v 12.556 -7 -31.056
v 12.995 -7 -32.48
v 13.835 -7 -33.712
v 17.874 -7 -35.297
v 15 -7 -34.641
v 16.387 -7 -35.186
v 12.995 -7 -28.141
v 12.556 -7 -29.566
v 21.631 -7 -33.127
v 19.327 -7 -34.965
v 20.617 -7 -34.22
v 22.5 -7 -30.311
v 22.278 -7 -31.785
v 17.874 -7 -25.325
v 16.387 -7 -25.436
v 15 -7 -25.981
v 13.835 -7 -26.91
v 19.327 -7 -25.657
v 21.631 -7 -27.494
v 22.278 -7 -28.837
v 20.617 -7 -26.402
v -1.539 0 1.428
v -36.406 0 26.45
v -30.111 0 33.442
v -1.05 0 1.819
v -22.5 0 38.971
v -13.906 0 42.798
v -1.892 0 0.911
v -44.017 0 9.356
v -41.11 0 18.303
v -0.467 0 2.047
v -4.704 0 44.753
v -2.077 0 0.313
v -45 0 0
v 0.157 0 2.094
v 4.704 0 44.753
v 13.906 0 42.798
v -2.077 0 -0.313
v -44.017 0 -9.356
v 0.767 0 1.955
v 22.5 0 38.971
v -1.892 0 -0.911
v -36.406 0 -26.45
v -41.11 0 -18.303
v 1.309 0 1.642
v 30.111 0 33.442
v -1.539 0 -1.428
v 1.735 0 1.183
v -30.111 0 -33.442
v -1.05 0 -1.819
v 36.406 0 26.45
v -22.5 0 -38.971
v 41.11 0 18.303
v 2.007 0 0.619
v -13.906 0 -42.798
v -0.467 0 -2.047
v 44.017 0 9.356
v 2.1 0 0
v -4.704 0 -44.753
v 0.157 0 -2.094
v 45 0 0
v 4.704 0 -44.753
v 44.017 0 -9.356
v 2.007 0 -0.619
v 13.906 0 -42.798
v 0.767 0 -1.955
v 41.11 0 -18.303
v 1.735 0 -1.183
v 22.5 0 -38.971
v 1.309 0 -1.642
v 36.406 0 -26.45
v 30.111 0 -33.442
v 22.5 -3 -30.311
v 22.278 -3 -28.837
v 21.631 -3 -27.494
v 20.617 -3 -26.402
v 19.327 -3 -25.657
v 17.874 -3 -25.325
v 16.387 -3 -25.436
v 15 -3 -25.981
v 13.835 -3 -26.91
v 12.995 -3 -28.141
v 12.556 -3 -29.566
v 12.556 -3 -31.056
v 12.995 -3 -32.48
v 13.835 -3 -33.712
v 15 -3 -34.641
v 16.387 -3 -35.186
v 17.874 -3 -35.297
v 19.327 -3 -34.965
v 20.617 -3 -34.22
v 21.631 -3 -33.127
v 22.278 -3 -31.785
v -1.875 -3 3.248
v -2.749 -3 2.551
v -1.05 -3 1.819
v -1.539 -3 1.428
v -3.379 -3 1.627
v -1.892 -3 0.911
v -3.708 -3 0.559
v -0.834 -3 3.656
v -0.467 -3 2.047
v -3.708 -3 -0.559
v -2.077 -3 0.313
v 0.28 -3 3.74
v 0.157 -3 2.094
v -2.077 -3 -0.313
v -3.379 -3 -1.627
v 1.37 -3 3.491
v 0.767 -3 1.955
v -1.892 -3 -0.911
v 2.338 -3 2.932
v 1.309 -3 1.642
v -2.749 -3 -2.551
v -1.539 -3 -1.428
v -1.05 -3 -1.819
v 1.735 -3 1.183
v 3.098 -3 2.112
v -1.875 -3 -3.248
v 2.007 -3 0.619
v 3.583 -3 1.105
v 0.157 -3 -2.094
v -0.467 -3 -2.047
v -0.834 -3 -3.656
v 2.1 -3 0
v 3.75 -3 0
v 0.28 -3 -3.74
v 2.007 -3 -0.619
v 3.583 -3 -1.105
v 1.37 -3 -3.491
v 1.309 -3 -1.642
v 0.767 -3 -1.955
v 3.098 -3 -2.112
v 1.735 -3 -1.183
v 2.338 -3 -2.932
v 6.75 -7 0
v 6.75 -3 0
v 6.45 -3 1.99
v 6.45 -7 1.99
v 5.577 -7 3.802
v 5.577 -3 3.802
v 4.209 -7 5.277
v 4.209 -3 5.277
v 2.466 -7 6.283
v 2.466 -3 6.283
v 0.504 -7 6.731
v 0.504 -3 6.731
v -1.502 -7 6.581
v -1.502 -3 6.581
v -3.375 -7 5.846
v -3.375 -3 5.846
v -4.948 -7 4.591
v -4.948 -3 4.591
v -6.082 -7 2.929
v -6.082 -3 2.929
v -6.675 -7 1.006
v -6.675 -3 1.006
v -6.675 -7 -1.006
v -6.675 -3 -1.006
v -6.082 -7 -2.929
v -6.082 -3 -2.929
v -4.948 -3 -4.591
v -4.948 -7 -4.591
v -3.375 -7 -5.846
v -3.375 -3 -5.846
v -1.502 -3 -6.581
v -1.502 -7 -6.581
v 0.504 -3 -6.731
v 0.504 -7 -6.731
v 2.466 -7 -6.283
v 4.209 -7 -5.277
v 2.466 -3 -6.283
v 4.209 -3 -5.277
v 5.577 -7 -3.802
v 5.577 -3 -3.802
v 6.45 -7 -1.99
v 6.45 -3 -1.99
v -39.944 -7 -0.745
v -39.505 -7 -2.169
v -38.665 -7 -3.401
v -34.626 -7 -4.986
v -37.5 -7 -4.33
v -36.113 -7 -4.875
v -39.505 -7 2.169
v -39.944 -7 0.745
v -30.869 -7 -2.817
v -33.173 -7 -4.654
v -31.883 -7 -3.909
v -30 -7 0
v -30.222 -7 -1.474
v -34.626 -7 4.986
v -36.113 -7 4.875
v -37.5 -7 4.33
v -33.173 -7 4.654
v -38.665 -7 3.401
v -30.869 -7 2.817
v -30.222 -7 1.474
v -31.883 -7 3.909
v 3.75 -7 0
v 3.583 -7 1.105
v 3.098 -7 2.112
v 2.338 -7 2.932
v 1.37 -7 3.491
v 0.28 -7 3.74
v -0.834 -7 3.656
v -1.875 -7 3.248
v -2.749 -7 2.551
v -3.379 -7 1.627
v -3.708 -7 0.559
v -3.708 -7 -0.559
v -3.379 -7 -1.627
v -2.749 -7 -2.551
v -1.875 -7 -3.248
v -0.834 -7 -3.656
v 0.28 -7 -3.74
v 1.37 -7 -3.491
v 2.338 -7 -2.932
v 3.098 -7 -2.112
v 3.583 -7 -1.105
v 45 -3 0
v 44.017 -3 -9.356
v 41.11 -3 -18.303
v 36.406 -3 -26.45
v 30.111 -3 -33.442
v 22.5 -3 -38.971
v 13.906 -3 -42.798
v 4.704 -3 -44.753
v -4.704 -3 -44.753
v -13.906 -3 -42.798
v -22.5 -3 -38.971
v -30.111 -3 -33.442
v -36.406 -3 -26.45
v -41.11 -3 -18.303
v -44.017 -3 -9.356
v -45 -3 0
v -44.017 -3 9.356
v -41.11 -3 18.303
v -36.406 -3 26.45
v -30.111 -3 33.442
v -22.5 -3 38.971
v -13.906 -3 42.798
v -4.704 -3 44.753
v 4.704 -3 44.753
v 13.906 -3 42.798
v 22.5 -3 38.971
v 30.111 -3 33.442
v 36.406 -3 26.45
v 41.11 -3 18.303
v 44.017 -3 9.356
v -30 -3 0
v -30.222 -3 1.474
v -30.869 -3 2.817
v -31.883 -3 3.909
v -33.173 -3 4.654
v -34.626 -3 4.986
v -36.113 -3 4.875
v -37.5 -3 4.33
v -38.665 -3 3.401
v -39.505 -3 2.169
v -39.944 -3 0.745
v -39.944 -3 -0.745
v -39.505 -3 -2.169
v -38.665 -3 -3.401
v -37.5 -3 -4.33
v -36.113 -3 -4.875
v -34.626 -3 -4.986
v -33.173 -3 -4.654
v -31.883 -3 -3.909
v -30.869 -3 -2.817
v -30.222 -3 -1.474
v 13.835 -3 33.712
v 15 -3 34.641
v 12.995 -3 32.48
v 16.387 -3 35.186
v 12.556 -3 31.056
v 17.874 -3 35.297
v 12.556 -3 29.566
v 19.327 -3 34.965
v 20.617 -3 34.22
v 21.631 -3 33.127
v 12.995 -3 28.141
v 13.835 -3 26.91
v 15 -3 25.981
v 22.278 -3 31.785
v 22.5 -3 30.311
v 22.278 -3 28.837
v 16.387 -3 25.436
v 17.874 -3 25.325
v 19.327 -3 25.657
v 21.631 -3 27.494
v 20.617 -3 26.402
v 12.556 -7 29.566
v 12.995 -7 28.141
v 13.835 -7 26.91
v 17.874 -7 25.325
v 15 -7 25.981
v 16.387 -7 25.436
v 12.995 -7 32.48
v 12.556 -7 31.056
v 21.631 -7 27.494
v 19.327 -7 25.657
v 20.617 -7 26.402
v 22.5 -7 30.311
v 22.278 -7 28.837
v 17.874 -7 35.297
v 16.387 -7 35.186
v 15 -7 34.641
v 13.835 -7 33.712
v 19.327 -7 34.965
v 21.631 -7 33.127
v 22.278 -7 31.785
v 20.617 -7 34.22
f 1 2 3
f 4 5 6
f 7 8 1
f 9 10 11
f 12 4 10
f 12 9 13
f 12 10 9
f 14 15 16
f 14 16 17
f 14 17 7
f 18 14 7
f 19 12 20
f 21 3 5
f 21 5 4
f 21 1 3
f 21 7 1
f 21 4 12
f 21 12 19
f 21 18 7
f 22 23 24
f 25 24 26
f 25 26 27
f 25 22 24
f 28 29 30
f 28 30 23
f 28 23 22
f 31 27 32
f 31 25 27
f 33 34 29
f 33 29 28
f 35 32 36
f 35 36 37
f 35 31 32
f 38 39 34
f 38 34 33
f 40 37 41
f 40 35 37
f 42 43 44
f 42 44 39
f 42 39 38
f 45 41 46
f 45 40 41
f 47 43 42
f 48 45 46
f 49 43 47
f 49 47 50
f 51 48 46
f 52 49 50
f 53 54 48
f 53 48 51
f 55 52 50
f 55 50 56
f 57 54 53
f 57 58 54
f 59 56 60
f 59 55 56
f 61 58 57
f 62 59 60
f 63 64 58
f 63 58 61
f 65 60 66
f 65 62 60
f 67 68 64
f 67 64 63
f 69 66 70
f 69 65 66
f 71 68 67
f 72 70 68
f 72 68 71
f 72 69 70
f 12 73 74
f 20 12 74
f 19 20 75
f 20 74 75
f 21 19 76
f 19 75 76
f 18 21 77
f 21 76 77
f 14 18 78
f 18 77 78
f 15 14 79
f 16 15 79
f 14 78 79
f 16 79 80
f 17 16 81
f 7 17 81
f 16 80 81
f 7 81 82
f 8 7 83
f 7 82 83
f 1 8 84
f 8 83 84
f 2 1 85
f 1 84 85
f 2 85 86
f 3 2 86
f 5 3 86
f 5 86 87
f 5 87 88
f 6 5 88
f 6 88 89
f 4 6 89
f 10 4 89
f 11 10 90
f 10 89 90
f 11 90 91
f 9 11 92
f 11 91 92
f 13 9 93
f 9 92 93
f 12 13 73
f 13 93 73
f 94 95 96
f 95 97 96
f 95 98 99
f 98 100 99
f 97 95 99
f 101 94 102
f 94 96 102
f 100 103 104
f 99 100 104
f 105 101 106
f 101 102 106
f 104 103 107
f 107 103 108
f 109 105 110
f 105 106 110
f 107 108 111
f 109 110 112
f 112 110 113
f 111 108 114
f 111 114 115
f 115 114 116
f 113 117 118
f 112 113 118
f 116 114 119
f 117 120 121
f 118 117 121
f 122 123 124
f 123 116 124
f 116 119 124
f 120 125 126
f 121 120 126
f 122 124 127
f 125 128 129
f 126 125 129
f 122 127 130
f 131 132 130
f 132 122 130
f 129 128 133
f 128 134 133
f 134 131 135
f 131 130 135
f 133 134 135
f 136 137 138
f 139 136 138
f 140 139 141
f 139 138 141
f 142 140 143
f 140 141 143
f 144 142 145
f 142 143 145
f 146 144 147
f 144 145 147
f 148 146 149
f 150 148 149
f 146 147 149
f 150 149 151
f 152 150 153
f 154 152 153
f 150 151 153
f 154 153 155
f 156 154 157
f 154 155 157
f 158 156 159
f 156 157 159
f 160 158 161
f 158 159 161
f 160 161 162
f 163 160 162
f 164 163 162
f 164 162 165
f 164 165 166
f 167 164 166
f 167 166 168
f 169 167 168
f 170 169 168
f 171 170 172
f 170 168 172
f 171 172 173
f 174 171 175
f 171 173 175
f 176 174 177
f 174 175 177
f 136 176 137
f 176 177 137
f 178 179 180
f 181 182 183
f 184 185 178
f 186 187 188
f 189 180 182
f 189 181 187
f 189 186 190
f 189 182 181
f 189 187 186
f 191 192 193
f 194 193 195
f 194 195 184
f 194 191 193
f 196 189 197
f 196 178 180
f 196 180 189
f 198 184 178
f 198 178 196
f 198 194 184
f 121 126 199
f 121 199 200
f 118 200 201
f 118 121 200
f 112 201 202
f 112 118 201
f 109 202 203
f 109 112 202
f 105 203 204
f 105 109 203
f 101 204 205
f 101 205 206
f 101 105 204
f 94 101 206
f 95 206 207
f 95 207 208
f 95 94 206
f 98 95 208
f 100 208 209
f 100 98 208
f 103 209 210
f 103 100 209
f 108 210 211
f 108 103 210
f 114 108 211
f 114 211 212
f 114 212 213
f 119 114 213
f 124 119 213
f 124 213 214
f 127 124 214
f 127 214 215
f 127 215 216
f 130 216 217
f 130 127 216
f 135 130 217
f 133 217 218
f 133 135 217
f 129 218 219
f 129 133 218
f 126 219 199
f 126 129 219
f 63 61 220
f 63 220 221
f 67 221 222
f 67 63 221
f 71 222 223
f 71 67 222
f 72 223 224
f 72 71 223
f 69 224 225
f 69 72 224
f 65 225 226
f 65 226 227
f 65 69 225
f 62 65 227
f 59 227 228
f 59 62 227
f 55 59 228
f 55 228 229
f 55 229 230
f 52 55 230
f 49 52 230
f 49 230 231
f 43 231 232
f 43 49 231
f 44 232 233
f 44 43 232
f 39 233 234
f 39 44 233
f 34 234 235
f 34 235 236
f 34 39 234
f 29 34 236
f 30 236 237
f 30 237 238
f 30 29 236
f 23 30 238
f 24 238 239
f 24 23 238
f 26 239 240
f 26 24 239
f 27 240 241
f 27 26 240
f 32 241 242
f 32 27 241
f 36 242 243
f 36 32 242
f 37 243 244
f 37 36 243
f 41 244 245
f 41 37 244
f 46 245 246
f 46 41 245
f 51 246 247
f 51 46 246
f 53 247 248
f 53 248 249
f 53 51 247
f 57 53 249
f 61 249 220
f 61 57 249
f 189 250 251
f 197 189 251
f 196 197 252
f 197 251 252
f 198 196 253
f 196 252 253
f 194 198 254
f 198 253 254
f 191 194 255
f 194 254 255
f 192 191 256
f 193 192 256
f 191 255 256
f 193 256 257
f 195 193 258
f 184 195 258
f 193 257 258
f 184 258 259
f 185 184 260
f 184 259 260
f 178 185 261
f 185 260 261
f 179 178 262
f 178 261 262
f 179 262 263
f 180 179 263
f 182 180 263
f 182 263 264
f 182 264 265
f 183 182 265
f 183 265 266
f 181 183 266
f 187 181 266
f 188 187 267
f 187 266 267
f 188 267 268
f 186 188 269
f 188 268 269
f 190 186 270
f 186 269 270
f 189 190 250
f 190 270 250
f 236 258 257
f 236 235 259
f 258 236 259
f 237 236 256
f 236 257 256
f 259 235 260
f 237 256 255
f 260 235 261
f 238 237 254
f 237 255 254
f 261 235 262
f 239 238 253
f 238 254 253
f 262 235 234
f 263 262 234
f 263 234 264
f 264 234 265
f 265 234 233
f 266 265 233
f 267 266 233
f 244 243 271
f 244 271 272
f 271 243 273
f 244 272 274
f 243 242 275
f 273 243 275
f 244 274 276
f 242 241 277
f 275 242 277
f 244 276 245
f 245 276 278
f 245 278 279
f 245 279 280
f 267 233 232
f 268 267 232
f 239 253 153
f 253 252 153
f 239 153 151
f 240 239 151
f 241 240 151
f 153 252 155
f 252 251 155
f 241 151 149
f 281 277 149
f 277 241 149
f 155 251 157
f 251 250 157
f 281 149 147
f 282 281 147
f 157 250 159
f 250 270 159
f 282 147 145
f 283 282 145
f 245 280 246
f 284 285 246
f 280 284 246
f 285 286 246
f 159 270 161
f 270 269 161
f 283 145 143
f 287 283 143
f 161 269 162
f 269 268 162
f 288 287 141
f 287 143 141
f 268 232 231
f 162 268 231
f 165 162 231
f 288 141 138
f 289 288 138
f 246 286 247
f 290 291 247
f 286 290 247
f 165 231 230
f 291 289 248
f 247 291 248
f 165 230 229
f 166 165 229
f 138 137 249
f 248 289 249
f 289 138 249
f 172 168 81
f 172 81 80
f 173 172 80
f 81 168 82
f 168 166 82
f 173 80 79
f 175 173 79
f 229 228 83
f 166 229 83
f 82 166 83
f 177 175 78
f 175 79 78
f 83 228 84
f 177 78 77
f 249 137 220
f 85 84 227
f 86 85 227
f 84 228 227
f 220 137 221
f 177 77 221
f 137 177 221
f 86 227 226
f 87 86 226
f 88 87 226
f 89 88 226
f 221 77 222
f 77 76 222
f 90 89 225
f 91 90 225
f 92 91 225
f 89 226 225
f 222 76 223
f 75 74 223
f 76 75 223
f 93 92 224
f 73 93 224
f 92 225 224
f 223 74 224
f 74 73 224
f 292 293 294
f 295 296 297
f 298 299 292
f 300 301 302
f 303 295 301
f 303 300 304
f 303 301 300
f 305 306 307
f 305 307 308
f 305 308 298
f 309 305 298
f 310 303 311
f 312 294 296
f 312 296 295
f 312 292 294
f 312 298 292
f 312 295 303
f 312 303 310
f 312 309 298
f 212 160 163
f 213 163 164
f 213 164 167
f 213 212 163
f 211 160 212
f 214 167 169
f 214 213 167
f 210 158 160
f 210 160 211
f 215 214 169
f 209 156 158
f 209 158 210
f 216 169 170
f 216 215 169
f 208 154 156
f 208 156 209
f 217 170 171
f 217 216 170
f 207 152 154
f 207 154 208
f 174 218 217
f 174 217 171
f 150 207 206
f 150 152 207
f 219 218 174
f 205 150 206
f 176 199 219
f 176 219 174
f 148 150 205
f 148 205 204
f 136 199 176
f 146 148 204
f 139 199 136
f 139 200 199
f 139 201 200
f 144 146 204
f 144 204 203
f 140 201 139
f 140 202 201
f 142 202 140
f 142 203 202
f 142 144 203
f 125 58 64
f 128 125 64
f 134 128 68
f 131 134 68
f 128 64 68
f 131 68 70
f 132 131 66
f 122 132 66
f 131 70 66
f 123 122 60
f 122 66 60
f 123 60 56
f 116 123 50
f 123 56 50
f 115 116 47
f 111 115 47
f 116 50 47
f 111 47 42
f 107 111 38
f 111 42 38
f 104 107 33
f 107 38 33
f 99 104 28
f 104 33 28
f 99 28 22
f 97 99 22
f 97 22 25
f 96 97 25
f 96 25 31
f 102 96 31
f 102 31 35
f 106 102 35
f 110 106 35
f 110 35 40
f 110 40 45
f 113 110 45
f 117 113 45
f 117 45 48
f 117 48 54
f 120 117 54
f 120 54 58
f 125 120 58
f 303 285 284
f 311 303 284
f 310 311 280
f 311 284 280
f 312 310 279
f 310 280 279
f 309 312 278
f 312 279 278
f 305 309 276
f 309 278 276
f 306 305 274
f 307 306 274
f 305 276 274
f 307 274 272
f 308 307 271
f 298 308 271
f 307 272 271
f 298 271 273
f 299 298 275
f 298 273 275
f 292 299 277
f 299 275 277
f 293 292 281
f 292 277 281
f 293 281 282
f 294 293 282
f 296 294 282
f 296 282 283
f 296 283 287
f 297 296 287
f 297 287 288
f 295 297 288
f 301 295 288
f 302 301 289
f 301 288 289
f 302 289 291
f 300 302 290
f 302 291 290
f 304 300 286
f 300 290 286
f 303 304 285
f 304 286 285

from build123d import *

# Parameters (mm, degrees)
ESQUISSE1_R             = 45
EXTRUSION1_DEPTH        = 3
ESQUISSE2_R             = 6.75
ESQUISSE2_R_2           = 3.75
ESQUISSE2_R_3           = 5
EXTRUSION2_DEPTH        = 4
ESQUISSE3_R             = 2.1
ENL_V_MAT_EXTRU_1_DEPTH = 8


with BuildPart() as part:
    # Esquisse1 → Extrusion1 (new body)
    with BuildSketch(Plane(origin=(0, 0, 0), x_dir=(1, 0, 0), z_dir=(0, 1, 0))):
        Circle(ESQUISSE1_R)
    extrude(amount=-EXTRUSION1_DEPTH)

    # Esquisse2 → Extrusion2 (add)
    with BuildSketch(Plane.XZ.offset(3)):
        Circle(ESQUISSE2_R)
        Circle(ESQUISSE2_R_2, mode=Mode.SUBTRACT)
        with Locations((-35, 0)):
            Circle(ESQUISSE2_R_3)
        with Locations((17.5, 30.310889132)):
            Circle(ESQUISSE2_R_3)
        with Locations((17.5, -30.310889132)):
            Circle(ESQUISSE2_R_3)
    extrude(amount=EXTRUSION2_DEPTH)

    # Esquisse3 → Enlèv. mat.-Extru.1 (cut, through all)
    with BuildSketch(Plane(origin=(0, 0, 0), x_dir=(1, 0, 0), z_dir=(0, 1, 0))):
        Circle(ESQUISSE3_R)
    extrude(amount=-ENL_V_MAT_EXTRU_1_DEPTH, mode=Mode.SUBTRACT)


solid = part.part
